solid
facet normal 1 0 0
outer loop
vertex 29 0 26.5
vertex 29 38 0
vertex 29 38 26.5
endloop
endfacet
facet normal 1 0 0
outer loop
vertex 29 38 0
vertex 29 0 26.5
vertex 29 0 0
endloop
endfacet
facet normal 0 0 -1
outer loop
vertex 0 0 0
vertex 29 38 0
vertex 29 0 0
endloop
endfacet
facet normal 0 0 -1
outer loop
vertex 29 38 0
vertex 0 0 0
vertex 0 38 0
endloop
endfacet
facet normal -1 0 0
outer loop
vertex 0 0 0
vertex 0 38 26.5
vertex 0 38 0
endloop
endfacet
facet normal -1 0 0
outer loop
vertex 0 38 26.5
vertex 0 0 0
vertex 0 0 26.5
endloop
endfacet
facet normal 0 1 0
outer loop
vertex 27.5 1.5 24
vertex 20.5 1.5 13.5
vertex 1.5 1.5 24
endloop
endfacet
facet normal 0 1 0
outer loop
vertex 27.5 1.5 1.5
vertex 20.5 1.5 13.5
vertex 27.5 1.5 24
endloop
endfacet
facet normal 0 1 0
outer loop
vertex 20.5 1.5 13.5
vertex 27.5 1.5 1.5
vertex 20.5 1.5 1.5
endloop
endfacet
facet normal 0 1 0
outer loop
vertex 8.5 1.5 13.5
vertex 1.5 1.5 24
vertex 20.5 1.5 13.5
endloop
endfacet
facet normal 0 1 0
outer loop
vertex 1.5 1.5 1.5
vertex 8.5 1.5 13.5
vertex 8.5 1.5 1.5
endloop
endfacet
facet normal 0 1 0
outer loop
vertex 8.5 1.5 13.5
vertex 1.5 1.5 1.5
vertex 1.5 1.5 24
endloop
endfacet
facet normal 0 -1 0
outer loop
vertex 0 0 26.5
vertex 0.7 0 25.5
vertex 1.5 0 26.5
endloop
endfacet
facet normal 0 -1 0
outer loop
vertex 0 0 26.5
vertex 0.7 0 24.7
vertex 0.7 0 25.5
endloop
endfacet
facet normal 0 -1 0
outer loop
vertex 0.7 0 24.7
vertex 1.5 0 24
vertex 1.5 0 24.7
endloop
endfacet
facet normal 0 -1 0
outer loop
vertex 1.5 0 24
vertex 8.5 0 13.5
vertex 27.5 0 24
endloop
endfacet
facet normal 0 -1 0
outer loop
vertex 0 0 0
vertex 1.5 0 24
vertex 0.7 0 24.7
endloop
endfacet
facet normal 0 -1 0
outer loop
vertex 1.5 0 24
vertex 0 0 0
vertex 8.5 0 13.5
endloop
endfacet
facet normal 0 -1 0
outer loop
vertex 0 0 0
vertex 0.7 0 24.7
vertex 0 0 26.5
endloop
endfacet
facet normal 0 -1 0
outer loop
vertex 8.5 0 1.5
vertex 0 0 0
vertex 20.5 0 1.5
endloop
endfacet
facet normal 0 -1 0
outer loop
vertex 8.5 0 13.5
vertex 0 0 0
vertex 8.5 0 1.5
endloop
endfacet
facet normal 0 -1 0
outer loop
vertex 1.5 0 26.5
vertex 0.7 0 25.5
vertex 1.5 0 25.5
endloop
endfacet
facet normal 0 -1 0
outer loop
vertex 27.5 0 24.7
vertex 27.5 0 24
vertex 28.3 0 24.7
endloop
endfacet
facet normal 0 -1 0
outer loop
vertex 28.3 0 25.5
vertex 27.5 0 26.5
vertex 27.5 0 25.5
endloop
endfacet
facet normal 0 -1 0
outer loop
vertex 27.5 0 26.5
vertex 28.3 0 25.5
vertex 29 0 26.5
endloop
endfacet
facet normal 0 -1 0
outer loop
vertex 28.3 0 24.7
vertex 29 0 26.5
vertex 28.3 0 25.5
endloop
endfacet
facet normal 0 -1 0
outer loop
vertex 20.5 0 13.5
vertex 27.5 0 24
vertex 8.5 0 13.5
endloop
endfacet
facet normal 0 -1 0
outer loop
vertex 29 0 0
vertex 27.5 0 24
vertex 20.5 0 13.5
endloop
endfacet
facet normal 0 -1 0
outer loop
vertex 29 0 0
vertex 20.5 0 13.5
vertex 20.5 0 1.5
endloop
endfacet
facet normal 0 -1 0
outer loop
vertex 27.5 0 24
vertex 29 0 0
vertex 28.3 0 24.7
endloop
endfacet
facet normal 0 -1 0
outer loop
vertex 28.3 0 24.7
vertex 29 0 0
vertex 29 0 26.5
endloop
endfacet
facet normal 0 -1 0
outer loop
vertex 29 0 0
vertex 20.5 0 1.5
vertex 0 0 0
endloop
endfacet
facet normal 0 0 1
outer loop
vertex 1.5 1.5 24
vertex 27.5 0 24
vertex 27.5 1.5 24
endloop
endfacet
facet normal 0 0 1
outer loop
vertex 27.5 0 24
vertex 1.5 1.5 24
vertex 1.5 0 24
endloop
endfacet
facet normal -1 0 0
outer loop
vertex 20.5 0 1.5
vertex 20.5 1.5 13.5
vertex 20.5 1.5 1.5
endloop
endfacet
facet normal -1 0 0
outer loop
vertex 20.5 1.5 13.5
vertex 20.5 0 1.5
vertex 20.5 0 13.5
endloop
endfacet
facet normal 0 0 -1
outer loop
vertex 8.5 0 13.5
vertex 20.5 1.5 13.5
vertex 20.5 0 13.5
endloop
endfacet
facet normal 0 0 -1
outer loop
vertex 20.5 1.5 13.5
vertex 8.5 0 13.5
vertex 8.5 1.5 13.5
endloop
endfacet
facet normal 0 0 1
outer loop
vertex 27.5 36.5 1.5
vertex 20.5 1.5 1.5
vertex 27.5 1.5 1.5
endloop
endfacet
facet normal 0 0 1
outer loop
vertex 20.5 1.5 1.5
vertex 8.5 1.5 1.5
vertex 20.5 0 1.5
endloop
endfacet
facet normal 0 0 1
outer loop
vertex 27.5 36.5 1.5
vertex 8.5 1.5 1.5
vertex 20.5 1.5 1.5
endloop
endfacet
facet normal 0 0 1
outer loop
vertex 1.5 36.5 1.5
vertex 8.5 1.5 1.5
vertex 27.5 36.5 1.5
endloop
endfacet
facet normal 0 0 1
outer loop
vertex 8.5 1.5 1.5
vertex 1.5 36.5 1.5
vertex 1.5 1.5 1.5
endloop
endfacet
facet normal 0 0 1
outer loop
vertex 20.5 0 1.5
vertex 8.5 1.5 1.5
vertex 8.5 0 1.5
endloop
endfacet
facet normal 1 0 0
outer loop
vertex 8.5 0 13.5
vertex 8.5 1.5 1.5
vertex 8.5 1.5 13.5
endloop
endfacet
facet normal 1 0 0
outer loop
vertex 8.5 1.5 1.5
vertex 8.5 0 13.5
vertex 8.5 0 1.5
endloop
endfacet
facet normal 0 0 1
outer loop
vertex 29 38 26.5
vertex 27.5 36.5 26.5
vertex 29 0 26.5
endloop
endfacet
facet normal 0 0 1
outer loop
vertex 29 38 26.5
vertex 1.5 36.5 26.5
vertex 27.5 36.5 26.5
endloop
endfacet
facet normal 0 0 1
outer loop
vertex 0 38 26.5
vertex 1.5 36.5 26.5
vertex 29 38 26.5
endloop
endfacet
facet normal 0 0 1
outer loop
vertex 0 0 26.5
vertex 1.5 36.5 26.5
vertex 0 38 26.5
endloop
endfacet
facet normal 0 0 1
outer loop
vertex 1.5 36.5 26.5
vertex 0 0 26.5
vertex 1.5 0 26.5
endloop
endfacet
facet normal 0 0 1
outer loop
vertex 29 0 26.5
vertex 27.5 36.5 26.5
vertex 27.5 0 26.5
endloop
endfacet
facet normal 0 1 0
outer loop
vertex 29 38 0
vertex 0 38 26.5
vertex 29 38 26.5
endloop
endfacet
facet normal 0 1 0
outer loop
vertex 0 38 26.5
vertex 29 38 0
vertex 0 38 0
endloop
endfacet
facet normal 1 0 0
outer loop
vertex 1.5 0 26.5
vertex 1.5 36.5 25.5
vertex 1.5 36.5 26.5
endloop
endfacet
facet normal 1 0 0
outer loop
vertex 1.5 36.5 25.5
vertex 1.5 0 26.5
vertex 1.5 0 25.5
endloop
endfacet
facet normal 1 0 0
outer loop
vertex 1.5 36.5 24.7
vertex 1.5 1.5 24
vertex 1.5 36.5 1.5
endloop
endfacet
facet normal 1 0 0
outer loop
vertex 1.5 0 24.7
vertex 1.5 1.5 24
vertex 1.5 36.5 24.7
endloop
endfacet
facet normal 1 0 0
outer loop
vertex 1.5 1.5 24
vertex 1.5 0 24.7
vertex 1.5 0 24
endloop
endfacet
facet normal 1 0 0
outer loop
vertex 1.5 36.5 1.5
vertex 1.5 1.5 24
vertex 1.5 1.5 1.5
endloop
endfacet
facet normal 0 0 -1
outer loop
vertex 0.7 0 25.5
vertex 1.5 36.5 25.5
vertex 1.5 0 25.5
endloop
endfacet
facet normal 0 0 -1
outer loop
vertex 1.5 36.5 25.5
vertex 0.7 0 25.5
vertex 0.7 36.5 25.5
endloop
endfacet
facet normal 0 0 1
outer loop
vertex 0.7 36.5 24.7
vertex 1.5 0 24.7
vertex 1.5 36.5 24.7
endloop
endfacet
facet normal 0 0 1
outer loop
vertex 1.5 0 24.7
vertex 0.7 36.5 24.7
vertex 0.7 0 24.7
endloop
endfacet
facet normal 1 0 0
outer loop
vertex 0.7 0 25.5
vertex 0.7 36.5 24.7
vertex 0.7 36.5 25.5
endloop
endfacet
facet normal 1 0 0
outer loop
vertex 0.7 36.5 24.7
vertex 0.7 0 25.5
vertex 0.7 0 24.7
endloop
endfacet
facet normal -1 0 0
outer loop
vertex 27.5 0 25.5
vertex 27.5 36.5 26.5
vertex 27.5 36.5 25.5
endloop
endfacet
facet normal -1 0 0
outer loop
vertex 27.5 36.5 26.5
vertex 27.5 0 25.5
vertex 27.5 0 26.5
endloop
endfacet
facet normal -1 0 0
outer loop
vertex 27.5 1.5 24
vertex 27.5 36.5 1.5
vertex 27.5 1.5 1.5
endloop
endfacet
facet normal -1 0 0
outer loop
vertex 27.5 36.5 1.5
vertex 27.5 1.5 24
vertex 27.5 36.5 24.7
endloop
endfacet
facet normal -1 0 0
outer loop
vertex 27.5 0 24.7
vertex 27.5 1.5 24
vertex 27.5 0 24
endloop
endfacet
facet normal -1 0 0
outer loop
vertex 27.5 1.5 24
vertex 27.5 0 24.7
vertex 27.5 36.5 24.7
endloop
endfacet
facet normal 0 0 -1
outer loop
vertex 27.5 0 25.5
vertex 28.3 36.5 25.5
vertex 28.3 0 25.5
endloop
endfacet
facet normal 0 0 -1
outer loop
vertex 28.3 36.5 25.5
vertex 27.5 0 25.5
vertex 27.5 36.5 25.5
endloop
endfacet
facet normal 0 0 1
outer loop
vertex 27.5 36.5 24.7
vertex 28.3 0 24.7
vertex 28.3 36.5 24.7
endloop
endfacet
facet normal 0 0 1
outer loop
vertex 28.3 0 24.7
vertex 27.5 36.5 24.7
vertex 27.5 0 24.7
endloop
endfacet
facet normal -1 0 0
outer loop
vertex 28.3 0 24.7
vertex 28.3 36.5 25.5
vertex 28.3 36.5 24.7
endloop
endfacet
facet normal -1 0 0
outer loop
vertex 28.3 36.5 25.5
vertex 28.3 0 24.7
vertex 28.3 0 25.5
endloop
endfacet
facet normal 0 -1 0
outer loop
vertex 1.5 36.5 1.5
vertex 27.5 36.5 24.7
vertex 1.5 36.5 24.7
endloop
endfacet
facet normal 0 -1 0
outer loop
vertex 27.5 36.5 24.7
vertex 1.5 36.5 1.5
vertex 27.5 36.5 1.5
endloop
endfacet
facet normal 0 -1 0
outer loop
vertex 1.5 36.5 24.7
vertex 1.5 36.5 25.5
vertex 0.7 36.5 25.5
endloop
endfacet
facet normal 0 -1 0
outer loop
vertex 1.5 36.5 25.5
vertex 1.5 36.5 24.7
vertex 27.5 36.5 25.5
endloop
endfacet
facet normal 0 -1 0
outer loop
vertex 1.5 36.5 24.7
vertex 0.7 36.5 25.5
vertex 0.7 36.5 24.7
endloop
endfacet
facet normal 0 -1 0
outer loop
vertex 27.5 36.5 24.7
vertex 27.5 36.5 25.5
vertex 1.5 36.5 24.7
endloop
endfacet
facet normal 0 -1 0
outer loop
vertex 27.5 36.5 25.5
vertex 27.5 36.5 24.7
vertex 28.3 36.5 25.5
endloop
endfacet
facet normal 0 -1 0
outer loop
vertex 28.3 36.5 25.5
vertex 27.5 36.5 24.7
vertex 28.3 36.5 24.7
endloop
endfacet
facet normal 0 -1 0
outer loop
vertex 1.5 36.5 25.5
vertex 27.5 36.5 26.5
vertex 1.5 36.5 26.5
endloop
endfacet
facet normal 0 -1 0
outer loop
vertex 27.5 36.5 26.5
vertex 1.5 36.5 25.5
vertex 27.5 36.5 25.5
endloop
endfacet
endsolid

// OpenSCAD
l=35;
w=26;
h=25;
t=1.5;

slot=0.80;
trim=2.5;

module cutout(x,z,len,height)
{
    translate([x+t,-t,z+t]){
        cube([len,3*t,height]);
    }
}

// Bottom
cube([w+2*t,l+2*t,t]);


// Front
translate([0,0,0]){
    rotate([0,0,0]){ 
        difference(){
           cube([w+2*t,t,h+t]);
            
           translate([0,-t,h+t-trim]){
               cube([w*2*t,3*t,trim]);
           }
           //cutout(3,15,20,3);
           cutout(7,0,12,12);
        }
    }
}

// Back
translate([w+2*t,l+2*t,0]){
    rotate([0,0,180]){
        difference(){
           cube([w+2*t,t,h+t]);
            
            //cutout(1.5,15,23,3);
        }
    }
}

// Left
translate([0,l+2*t,0]){
    rotate([0,0,-90]){ 
        difference() {
           cube([l+2*t,t,h+t]);
           translate([0,t-slot,h+t-slot-1]){
               cube([l+2*t,slot+.2,slot]);
           }
            //cutout(7.5,15,20,3);
        }
    }
}

// Right
translate([w+2*t,0,0]){
    rotate([0,0,90]){
        difference(){ 
           cube([l+2*t,t,h+t]);
            
            translate([0,t-slot,h+t-slot-1]){
               cube([l+2*t,slot+0.2,slot]);
           }
            //cutout(7.5,15,20,3);
            
        }
    }
}
